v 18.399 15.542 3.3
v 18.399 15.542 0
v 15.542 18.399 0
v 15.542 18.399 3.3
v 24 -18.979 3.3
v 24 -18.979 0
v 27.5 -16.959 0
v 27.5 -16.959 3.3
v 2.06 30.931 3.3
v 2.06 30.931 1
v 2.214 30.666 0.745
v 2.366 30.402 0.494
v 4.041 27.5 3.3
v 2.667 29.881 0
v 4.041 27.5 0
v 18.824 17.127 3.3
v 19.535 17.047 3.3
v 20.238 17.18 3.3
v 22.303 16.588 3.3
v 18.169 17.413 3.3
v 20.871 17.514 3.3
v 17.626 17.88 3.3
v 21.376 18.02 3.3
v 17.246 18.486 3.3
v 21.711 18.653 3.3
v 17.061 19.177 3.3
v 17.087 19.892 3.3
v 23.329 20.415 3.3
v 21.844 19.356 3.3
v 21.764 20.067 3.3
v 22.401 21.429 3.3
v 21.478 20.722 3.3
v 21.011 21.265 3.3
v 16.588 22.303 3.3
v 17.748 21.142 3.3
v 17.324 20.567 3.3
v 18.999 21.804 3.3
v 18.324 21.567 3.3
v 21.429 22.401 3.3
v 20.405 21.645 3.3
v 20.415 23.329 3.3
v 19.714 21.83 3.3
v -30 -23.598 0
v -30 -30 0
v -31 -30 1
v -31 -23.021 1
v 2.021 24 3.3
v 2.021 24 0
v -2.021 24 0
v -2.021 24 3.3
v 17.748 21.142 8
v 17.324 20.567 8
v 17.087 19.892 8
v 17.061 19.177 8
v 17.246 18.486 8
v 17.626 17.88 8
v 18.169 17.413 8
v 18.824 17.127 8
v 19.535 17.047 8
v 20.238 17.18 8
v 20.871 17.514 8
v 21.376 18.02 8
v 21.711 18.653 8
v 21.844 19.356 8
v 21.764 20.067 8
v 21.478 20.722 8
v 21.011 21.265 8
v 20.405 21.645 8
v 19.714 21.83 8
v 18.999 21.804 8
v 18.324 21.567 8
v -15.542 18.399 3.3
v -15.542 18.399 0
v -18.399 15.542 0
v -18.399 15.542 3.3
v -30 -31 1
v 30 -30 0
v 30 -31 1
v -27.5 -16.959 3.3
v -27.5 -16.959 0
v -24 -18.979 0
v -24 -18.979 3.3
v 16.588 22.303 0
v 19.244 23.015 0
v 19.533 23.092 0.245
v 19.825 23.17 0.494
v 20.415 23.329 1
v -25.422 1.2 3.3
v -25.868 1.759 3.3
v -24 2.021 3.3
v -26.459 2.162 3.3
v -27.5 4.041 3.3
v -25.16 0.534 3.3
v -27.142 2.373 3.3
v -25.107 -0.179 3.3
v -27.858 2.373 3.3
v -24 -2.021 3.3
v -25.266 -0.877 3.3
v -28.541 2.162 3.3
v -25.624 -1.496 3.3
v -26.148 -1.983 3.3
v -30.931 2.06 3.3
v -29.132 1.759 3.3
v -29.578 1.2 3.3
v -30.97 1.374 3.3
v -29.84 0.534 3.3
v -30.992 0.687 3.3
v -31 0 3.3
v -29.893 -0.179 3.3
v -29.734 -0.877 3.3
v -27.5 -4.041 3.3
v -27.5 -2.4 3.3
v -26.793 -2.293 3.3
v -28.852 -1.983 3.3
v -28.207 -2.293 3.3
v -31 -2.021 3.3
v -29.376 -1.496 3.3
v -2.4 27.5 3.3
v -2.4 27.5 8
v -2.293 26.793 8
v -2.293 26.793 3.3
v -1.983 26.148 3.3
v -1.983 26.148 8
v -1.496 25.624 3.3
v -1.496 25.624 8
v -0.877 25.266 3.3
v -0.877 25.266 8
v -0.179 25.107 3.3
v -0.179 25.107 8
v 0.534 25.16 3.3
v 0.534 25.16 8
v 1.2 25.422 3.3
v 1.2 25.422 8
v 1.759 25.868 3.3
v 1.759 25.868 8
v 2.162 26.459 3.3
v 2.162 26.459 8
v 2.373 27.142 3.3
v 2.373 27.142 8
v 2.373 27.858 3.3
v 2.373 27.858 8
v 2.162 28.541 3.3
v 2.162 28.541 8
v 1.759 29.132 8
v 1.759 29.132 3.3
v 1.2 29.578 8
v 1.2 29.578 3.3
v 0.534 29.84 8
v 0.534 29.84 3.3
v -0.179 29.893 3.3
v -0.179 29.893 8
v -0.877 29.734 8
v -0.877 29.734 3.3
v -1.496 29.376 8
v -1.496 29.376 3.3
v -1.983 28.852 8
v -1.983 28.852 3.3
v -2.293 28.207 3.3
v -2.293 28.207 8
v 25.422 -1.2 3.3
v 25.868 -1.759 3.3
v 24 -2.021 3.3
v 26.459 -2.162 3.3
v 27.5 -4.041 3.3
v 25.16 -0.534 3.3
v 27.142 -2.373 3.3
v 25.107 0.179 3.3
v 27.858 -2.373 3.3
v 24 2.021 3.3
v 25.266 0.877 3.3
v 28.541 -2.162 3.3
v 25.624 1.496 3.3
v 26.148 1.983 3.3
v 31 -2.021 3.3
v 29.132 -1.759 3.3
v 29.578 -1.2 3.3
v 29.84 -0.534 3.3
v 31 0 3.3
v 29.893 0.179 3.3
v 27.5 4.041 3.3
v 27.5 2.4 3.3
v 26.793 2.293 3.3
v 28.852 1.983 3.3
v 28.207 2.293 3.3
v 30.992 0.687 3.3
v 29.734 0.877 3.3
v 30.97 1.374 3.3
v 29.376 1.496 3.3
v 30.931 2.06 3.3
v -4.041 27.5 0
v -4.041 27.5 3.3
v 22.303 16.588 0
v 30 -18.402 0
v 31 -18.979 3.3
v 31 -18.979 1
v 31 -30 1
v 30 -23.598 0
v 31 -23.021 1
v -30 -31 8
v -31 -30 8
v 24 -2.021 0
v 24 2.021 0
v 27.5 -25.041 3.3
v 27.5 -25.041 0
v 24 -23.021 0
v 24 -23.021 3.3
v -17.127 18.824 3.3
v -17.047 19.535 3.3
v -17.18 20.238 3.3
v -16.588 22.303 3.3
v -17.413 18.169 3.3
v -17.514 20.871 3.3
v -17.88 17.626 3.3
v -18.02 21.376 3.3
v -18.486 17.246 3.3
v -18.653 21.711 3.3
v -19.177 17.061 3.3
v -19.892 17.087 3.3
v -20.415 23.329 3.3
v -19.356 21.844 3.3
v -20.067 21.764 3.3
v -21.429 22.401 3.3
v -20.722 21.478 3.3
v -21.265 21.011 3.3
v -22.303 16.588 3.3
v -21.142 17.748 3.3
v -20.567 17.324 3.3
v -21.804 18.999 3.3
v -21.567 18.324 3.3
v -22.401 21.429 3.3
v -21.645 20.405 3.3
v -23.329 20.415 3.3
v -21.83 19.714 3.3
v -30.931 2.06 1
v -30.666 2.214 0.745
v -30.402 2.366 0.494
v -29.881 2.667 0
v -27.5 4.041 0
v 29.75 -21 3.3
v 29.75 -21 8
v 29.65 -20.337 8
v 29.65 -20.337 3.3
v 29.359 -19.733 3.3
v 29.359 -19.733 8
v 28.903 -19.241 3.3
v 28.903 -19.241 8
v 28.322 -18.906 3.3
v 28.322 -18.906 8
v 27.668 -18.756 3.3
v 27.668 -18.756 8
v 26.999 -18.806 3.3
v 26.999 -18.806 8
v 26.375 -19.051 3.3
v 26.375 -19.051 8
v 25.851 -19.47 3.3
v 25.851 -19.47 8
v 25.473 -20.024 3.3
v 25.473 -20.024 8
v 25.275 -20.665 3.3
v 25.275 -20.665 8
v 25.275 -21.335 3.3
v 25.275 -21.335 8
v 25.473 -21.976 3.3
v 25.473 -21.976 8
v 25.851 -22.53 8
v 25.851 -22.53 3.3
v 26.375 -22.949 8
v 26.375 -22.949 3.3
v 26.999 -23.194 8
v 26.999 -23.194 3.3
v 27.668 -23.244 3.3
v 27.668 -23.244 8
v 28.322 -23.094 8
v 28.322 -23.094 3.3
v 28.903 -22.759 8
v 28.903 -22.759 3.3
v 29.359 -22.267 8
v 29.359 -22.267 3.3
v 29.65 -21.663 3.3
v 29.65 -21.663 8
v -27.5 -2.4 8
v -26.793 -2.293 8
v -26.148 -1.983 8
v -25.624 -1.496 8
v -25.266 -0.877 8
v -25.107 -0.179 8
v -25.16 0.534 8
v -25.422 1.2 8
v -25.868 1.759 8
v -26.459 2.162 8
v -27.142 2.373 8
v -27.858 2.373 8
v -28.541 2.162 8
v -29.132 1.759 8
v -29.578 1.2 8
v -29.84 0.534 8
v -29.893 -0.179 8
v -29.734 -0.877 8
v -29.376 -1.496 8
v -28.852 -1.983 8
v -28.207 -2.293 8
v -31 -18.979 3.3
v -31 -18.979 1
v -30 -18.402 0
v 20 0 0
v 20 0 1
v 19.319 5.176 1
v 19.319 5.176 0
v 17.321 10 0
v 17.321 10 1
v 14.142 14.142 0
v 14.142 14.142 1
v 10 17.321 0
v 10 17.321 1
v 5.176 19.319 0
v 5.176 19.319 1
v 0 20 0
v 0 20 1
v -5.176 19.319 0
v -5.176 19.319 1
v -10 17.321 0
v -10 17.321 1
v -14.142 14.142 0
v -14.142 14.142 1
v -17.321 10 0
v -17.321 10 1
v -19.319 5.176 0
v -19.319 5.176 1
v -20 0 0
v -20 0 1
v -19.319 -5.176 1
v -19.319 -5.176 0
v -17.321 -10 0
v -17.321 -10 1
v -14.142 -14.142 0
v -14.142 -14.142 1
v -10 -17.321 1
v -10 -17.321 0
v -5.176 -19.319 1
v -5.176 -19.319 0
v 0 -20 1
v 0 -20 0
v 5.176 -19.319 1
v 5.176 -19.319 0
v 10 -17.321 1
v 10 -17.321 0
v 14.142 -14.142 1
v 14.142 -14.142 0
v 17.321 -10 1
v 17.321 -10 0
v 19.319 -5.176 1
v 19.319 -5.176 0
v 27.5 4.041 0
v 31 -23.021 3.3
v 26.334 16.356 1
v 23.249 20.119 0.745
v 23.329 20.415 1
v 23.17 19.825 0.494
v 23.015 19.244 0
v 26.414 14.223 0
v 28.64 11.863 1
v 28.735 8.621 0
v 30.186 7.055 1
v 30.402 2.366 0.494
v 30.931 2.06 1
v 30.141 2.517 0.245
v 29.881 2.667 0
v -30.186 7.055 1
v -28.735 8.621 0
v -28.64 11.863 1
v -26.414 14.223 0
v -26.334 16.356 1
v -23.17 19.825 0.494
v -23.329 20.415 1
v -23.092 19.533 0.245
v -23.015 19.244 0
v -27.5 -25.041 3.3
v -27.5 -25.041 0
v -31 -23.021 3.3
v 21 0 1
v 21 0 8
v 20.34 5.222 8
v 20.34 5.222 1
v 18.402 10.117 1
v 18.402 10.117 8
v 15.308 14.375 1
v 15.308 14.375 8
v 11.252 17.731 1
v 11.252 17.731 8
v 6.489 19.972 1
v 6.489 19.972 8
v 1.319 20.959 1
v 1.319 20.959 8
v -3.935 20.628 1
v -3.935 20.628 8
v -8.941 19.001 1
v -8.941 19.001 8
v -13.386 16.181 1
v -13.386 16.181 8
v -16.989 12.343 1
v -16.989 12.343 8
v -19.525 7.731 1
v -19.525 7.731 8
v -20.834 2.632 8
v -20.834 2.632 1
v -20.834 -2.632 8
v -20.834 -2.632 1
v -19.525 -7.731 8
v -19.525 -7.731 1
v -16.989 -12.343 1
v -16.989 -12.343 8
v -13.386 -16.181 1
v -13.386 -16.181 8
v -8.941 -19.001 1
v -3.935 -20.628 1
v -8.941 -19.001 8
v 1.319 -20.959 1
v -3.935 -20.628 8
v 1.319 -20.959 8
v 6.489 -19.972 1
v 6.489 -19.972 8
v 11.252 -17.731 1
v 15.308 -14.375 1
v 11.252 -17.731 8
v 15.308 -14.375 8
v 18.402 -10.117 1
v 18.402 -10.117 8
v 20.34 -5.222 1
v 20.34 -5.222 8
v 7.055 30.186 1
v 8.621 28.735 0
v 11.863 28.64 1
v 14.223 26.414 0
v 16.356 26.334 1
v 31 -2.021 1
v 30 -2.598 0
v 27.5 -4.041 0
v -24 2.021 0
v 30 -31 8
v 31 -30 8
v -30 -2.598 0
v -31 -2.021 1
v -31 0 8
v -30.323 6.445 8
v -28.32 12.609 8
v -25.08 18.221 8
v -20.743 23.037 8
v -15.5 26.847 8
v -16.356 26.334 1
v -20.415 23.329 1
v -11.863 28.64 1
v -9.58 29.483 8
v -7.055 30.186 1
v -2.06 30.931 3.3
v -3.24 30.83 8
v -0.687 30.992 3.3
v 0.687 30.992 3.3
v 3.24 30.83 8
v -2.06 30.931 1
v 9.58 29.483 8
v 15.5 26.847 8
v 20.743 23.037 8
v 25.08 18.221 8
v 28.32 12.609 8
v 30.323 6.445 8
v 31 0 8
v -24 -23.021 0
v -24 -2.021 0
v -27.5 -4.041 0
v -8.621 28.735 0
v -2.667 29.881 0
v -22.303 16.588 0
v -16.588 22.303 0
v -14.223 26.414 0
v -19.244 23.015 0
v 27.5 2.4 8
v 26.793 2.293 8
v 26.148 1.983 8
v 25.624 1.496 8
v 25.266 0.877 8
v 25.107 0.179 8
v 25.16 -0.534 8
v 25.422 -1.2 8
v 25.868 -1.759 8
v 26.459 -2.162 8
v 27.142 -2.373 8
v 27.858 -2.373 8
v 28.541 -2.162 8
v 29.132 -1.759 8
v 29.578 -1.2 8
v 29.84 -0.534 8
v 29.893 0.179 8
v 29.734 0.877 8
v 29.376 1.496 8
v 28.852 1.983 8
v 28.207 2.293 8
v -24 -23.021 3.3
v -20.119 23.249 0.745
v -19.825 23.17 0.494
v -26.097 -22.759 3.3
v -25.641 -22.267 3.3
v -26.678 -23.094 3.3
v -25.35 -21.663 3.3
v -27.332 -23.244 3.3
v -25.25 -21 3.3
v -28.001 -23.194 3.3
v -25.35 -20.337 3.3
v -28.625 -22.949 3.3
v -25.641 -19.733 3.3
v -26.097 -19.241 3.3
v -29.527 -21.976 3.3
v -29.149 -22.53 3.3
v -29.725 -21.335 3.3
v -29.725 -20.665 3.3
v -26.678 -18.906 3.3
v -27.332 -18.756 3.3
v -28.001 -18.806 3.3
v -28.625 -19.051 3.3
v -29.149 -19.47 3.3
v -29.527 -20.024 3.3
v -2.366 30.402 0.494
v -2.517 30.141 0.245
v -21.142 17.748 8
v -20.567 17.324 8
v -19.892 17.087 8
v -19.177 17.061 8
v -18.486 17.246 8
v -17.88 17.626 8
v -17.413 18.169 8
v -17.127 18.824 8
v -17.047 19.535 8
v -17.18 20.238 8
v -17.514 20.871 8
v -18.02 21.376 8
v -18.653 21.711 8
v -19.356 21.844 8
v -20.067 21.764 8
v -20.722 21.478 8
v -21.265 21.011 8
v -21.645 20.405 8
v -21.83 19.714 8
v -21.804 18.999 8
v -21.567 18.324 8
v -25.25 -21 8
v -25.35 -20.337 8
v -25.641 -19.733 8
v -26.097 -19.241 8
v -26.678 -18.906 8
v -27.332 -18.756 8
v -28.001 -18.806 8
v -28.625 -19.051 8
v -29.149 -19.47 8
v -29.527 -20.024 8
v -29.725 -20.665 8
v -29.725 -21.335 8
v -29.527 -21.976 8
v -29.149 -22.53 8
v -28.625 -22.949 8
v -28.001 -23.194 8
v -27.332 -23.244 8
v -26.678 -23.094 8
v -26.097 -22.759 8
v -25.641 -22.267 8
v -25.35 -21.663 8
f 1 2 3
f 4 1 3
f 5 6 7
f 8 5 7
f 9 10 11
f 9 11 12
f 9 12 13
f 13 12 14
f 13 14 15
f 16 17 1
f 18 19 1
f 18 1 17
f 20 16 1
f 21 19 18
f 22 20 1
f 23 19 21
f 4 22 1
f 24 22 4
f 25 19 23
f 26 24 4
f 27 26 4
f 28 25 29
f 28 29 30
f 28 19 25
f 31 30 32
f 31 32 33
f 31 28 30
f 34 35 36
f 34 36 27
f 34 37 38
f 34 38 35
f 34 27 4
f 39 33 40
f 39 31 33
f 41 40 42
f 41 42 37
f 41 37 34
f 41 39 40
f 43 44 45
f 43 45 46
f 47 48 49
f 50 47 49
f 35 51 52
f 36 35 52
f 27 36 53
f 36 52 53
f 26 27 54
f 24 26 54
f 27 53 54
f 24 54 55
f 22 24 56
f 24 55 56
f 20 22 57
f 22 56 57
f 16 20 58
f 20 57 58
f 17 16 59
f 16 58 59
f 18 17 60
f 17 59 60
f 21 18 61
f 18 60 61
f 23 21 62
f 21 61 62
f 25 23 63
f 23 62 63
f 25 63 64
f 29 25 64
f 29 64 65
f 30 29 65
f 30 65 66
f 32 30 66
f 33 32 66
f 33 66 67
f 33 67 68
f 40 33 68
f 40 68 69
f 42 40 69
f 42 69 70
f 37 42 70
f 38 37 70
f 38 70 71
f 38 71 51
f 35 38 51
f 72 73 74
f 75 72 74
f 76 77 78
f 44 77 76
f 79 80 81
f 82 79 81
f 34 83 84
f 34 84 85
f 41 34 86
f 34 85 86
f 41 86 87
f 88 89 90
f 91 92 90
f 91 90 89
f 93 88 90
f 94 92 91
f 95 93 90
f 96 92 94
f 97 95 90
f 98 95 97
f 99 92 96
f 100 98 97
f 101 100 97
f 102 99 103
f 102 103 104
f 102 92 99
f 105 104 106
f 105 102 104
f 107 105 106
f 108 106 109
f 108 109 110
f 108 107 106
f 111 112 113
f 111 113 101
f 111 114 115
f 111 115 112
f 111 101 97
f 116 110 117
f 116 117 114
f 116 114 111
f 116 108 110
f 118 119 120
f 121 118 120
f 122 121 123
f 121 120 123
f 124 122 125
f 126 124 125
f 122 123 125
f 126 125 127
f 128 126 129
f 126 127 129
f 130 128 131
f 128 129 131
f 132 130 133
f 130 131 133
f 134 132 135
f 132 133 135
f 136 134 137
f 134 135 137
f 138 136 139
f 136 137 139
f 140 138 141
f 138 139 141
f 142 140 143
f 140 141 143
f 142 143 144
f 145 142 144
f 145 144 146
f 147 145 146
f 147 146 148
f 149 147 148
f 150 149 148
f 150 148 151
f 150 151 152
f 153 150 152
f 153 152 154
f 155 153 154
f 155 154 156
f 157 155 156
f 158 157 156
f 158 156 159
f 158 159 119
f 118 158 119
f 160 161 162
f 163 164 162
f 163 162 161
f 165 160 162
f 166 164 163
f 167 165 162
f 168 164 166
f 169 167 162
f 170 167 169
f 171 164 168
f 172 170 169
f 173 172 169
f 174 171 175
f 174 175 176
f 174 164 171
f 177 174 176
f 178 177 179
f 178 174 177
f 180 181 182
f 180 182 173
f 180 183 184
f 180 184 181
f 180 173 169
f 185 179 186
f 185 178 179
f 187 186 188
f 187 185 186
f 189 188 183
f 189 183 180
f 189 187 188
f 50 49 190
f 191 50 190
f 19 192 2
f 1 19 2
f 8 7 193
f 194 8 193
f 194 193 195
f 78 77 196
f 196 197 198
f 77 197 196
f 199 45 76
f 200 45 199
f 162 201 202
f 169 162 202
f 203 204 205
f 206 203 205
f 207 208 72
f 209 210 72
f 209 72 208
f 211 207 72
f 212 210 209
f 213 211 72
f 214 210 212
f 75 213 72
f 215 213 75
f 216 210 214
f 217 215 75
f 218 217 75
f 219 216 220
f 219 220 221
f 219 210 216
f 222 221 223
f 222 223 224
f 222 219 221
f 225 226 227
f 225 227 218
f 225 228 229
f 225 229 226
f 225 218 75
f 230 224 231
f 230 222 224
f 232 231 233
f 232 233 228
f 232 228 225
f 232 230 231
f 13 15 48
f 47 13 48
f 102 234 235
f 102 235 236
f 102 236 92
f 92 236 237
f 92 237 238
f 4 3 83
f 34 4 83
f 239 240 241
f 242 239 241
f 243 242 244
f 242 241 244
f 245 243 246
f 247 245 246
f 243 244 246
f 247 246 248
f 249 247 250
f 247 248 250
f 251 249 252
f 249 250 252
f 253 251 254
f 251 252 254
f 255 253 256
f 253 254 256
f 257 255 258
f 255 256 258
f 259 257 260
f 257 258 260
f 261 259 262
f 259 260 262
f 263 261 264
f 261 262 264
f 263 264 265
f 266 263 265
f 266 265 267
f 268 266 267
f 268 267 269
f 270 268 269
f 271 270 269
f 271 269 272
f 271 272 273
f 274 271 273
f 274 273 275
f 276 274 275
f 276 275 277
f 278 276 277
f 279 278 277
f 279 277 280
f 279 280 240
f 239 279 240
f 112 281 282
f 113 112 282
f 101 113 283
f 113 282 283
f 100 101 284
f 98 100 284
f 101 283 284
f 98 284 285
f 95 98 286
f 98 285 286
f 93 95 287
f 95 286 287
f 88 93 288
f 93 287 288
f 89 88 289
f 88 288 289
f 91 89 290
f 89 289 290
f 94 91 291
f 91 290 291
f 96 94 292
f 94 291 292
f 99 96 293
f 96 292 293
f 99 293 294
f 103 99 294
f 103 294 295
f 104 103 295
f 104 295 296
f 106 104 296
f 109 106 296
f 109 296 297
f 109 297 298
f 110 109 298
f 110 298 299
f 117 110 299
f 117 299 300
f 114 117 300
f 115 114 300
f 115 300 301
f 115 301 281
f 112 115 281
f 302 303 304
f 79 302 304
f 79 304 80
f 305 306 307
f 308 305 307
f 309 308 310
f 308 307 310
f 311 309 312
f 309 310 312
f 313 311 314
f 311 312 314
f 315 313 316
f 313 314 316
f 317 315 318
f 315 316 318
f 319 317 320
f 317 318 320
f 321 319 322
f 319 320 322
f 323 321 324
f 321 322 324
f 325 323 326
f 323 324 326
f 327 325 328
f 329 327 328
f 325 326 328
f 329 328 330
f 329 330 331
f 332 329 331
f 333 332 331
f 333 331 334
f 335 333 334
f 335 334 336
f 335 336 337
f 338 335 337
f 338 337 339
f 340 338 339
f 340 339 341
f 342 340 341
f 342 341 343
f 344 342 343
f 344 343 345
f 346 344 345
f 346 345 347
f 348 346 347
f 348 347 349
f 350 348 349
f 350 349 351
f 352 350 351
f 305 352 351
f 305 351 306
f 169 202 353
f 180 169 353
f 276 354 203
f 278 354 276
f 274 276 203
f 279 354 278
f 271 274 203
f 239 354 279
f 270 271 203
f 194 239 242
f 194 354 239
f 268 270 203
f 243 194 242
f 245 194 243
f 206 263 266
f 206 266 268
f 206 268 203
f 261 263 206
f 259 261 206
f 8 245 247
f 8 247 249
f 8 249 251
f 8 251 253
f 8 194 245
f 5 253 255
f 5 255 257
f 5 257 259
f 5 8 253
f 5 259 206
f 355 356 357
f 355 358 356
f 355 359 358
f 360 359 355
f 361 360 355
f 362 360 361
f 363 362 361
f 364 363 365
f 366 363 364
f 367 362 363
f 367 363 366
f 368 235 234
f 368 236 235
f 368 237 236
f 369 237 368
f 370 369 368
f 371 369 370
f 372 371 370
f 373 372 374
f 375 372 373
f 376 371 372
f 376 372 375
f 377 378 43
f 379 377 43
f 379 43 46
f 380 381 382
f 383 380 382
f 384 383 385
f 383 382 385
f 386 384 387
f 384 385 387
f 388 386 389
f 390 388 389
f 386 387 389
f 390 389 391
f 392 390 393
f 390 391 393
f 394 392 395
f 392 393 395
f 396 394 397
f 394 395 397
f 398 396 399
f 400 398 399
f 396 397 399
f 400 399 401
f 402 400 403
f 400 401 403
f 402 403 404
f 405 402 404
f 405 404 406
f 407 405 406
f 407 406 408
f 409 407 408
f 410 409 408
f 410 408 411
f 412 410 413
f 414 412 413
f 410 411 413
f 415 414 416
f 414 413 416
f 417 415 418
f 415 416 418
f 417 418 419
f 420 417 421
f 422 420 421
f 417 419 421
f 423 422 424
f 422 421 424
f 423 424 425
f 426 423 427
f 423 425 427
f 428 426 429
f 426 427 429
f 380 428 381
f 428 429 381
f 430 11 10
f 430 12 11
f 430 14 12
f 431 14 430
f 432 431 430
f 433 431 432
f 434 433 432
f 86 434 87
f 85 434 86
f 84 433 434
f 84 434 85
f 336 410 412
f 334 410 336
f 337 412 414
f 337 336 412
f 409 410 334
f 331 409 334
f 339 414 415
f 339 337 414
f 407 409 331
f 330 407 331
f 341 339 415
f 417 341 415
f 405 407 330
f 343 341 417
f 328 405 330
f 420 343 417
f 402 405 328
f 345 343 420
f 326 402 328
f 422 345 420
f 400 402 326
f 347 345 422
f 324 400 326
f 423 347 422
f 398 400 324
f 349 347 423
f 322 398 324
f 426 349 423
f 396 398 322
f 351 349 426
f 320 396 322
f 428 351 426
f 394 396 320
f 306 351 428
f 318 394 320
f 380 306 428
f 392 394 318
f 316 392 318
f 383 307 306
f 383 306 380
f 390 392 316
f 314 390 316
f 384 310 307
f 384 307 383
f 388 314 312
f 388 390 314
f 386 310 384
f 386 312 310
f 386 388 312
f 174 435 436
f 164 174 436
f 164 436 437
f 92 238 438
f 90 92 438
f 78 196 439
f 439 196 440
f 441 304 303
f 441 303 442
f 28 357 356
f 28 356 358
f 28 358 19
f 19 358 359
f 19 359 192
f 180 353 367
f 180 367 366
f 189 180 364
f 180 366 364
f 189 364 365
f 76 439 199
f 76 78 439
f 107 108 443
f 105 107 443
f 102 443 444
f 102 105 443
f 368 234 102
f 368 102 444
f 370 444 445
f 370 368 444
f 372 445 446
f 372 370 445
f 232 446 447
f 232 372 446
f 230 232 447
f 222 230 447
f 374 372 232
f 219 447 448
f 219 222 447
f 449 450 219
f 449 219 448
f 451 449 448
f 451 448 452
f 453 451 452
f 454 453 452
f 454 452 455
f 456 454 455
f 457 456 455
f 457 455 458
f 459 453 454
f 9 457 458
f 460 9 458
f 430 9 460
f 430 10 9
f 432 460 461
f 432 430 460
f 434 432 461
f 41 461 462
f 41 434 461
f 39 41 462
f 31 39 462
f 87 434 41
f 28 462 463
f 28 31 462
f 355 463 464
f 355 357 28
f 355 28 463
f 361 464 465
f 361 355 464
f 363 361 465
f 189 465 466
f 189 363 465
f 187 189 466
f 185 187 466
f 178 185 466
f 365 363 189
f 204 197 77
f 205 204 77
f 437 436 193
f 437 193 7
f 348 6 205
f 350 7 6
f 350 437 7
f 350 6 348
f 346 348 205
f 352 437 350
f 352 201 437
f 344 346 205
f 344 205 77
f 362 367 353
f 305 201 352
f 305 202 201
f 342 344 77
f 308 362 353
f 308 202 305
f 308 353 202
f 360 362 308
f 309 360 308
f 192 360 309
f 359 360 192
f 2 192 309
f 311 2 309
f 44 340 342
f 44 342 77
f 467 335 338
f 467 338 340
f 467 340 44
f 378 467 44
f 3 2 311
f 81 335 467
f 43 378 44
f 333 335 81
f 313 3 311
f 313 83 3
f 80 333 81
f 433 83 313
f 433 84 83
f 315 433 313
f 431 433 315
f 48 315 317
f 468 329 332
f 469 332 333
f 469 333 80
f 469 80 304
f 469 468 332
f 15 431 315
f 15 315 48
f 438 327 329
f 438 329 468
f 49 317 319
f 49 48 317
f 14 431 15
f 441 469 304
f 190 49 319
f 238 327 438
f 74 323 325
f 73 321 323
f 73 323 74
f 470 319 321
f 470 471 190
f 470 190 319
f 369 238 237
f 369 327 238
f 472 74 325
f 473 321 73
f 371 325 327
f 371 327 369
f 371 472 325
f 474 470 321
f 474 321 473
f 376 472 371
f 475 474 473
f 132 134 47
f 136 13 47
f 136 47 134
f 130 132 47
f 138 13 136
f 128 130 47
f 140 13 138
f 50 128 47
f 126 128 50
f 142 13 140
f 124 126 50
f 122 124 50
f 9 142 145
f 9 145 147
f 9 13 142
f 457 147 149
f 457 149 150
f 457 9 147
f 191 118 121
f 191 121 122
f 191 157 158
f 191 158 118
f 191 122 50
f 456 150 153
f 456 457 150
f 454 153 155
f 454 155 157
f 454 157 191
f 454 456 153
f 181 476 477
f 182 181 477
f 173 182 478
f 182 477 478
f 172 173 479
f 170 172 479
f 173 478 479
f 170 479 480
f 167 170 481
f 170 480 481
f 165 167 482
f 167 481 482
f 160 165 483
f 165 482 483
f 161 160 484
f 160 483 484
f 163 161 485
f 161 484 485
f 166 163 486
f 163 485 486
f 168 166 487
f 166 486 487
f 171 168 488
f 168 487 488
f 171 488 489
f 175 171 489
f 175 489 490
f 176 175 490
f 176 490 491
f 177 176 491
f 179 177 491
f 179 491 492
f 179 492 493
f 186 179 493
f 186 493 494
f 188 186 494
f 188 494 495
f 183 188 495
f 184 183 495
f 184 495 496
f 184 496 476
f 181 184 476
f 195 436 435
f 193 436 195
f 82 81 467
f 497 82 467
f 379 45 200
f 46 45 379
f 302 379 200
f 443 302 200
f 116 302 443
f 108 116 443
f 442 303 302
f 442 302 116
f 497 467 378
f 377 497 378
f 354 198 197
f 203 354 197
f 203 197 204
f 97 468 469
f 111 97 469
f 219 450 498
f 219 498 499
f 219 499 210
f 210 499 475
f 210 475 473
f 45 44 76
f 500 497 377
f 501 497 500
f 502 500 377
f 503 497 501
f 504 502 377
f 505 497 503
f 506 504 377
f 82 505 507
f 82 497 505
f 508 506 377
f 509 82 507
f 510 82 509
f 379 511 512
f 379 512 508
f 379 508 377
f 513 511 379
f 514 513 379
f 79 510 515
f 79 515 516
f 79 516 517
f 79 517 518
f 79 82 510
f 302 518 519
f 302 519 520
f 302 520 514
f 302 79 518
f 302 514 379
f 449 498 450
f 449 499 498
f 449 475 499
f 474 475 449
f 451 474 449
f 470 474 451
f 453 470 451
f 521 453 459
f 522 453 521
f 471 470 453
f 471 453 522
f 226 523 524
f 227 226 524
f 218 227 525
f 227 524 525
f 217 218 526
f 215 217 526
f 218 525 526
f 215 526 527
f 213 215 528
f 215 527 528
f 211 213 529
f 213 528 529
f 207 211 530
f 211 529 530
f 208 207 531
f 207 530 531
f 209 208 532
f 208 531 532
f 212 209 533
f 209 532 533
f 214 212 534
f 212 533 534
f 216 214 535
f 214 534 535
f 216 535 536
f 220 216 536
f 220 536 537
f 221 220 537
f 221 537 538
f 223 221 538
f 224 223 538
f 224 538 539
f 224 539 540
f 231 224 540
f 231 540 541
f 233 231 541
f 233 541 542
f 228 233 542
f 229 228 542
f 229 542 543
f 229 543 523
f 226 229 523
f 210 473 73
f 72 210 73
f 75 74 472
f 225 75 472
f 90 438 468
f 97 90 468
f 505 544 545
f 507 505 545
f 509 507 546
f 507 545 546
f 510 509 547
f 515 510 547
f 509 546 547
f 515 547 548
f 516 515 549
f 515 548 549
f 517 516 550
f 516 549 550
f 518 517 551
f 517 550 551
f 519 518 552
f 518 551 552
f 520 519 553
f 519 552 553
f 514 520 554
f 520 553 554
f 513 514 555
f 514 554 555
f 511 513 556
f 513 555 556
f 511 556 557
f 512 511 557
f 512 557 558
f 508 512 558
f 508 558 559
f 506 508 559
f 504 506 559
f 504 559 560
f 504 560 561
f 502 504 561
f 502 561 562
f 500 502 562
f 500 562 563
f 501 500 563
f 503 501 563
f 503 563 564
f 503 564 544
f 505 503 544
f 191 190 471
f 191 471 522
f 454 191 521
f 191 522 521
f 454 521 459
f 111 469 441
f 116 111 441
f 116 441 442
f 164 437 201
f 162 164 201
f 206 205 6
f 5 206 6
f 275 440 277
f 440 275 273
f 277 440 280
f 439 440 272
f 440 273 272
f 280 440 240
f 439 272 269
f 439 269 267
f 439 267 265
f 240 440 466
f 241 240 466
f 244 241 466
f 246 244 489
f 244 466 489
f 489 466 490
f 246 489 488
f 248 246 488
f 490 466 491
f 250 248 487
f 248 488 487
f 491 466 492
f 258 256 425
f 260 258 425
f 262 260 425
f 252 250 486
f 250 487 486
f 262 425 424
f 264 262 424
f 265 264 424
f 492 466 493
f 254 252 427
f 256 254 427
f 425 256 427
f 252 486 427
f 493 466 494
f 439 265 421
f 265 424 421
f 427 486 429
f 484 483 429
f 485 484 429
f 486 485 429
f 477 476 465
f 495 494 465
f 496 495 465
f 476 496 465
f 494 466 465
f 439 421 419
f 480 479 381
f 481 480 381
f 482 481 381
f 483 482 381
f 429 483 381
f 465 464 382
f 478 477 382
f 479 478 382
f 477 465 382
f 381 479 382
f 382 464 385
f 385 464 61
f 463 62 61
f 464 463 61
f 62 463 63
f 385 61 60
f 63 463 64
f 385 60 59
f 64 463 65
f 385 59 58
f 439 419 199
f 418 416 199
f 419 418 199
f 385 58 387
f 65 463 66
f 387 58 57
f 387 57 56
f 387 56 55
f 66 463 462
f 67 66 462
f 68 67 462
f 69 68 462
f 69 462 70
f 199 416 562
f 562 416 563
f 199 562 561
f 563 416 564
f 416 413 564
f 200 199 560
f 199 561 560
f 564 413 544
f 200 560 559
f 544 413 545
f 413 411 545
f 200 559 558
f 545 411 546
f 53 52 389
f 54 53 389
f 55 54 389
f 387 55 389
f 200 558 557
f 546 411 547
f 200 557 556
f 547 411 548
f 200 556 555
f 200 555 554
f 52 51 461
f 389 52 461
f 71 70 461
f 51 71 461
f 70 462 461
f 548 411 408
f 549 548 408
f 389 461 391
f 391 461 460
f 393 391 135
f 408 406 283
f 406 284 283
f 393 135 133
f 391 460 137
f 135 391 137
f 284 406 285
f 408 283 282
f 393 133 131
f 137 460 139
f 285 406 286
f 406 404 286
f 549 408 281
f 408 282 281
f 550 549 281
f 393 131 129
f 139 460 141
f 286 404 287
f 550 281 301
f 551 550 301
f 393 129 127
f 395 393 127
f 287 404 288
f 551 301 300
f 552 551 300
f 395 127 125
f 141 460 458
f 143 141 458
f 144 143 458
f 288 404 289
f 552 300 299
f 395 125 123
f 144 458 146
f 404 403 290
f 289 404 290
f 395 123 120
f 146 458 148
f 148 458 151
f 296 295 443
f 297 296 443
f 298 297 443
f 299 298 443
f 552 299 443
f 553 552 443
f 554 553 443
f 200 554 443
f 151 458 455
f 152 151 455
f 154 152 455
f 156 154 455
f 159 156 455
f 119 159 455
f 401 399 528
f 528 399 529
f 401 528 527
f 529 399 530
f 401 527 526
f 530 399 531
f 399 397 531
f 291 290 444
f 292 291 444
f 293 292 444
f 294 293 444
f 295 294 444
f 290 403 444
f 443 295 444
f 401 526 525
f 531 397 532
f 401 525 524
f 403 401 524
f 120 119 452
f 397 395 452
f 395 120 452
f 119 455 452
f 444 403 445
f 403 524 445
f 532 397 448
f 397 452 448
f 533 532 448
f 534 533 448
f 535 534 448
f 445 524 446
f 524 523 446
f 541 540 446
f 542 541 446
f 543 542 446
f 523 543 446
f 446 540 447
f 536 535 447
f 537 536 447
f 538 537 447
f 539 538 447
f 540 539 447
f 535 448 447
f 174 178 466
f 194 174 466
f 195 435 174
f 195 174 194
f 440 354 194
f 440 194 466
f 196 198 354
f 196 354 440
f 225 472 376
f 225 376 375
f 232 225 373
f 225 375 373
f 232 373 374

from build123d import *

# Parameters (mm, degrees)
EXTRUDE_1_DEPTH          = 8
HOLE_WIZARD_M4_1_D       = 4.8
PATTERN_CIRCULAR_1_COUNT = 8
CHAMFER_1_SIZE           = 1
CUT_EXTRUDE_2_DEPTH      = 3.3
PATTERN_CIRCULAR_3_COUNT = 8
SKETCH_7_R               = 21
CUT_EXTRUDE_4_DEPTH      = 7
SKETCH_8_R               = 20
CUT_EXTRUDE_5_DEPTH      = 45.395945761
HOLE_WIZARD_M4_2_D       = 4.5
CUT_EXTRUDE_6_DEPTH      = 3.3


with BuildPart() as part:
    # ｽｹｯﾁ1 → ﾎﾞｽ - 押し出し1 (new body)
    with BuildSketch(Plane.XY):
        with BuildLine():
            Line((31, -31), (-31, -31))
            Line((-31, -31), (-31, 0))
            ThreePointArc((-31, 0), (0, 31), (31, 0))
            Line((31, 0), (31, -31))
        make_face()
    extrude(amount=EXTRUDE_1_DEPTH)

    # M4 すきま穴1 (through all)
    with Locations(Plane(origin=(0, 0, 0), x_dir=(1, 0, 0), z_dir=(0, 0, -1))):
        with Locations((0, -27.5)):
            hole_wizard_m4_1 = Hole(HOLE_WIZARD_M4_1_D / 2)

    # 円形ﾊﾟﾀｰﾝ1: M4 すきま穴1 ×8 about axis, 3 skipped
    pattern_circular_1_axis = Axis((0, 0, 0), (0, 0, -1))
    add([hole_wizard_m4_1.rotate(pattern_circular_1_axis, i * 360 / PATTERN_CIRCULAR_1_COUNT) for i in range(1, PATTERN_CIRCULAR_1_COUNT) if i not in (3, 4, 5)], mode=Mode.SUBTRACT)

    # 面取り1
    chamfer_1_edges = [part.edges().sort_by_distance(p)[0] for p in [
        (31, -15.5, 0),
        (0, -31, 0),
        (-31, -15.5, 0),
        (0, 31, 0),
        (31, -31, 4),
        (-31, -31, 4),
    ]]
    chamfer(chamfer_1_edges, length=CHAMFER_1_SIZE)

    # ｽｹｯﾁ5 → ｶｯﾄ - 押し出し2 (cut)
    with BuildSketch(Plane(origin=(0, 0, 0), x_dir=(-1, 0, 0), z_dir=(0, 0, -1))):
        Polygon((2.020725942, 24), (4.041451884, 27.5), (2.020725942, 31), (-2.020725942, 31), (-4.041451884, 27.5), (-2.020725942, 24), align=None)
    cut_extrude_2 = extrude(amount=-CUT_EXTRUDE_2_DEPTH, mode=Mode.SUBTRACT)

    # 円形ﾊﾟﾀｰﾝ3: ｶｯﾄ - 押し出し2 ×8 about axis, 3 skipped
    pattern_circular_3_axis = Axis((0, 0, 0), (0, 0, -1))
    add([cut_extrude_2.rotate(pattern_circular_3_axis, i * 360 / PATTERN_CIRCULAR_3_COUNT) for i in range(1, PATTERN_CIRCULAR_3_COUNT) if i not in (3, 4, 5)], mode=Mode.SUBTRACT)

    # ｽｹｯﾁ7 → ｶｯﾄ - 押し出し4 (cut)
    with BuildSketch(Plane.XY.offset(8)):
        Circle(SKETCH_7_R)
    extrude(amount=-CUT_EXTRUDE_4_DEPTH, mode=Mode.SUBTRACT)

    # ｽｹｯﾁ8 → ｶｯﾄ - 押し出し5 (cut, through all)
    with BuildSketch(Plane.XY.offset(1)):
        Circle(SKETCH_8_R)
    extrude(amount=-CUT_EXTRUDE_5_DEPTH, mode=Mode.SUBTRACT)

    # M4 すきま穴2 (through all)
    with Locations(Plane(origin=(0, 0, 0), x_dir=(-1, 0, 0), z_dir=(0, 0, -1))):
        with Locations((-27.5, -21), (27.5, -21)):
            Hole(HOLE_WIZARD_M4_2_D / 2)

    # ｽｹｯﾁ11 → ｶｯﾄ - 押し出し6 (cut)
    with BuildSketch(Plane(origin=(0, 0, 0), x_dir=(-1, 0, 0), z_dir=(0, 0, -1))):
        Polygon((-24, -23.020725942), (-24, -18.979274058), (-27.5, -16.958548116), (-31, -18.979274058), (-31, -23.020725942), (-27.5, -25.041451884), align=None)
        Polygon((27.5, -25.041451884), (31, -23.020725942), (31, -18.979274058), (27.5, -16.958548116), (24, -18.979274058), (24, -23.020725942), align=None)
    extrude(amount=-CUT_EXTRUDE_6_DEPTH, mode=Mode.SUBTRACT)


solid = part.part
